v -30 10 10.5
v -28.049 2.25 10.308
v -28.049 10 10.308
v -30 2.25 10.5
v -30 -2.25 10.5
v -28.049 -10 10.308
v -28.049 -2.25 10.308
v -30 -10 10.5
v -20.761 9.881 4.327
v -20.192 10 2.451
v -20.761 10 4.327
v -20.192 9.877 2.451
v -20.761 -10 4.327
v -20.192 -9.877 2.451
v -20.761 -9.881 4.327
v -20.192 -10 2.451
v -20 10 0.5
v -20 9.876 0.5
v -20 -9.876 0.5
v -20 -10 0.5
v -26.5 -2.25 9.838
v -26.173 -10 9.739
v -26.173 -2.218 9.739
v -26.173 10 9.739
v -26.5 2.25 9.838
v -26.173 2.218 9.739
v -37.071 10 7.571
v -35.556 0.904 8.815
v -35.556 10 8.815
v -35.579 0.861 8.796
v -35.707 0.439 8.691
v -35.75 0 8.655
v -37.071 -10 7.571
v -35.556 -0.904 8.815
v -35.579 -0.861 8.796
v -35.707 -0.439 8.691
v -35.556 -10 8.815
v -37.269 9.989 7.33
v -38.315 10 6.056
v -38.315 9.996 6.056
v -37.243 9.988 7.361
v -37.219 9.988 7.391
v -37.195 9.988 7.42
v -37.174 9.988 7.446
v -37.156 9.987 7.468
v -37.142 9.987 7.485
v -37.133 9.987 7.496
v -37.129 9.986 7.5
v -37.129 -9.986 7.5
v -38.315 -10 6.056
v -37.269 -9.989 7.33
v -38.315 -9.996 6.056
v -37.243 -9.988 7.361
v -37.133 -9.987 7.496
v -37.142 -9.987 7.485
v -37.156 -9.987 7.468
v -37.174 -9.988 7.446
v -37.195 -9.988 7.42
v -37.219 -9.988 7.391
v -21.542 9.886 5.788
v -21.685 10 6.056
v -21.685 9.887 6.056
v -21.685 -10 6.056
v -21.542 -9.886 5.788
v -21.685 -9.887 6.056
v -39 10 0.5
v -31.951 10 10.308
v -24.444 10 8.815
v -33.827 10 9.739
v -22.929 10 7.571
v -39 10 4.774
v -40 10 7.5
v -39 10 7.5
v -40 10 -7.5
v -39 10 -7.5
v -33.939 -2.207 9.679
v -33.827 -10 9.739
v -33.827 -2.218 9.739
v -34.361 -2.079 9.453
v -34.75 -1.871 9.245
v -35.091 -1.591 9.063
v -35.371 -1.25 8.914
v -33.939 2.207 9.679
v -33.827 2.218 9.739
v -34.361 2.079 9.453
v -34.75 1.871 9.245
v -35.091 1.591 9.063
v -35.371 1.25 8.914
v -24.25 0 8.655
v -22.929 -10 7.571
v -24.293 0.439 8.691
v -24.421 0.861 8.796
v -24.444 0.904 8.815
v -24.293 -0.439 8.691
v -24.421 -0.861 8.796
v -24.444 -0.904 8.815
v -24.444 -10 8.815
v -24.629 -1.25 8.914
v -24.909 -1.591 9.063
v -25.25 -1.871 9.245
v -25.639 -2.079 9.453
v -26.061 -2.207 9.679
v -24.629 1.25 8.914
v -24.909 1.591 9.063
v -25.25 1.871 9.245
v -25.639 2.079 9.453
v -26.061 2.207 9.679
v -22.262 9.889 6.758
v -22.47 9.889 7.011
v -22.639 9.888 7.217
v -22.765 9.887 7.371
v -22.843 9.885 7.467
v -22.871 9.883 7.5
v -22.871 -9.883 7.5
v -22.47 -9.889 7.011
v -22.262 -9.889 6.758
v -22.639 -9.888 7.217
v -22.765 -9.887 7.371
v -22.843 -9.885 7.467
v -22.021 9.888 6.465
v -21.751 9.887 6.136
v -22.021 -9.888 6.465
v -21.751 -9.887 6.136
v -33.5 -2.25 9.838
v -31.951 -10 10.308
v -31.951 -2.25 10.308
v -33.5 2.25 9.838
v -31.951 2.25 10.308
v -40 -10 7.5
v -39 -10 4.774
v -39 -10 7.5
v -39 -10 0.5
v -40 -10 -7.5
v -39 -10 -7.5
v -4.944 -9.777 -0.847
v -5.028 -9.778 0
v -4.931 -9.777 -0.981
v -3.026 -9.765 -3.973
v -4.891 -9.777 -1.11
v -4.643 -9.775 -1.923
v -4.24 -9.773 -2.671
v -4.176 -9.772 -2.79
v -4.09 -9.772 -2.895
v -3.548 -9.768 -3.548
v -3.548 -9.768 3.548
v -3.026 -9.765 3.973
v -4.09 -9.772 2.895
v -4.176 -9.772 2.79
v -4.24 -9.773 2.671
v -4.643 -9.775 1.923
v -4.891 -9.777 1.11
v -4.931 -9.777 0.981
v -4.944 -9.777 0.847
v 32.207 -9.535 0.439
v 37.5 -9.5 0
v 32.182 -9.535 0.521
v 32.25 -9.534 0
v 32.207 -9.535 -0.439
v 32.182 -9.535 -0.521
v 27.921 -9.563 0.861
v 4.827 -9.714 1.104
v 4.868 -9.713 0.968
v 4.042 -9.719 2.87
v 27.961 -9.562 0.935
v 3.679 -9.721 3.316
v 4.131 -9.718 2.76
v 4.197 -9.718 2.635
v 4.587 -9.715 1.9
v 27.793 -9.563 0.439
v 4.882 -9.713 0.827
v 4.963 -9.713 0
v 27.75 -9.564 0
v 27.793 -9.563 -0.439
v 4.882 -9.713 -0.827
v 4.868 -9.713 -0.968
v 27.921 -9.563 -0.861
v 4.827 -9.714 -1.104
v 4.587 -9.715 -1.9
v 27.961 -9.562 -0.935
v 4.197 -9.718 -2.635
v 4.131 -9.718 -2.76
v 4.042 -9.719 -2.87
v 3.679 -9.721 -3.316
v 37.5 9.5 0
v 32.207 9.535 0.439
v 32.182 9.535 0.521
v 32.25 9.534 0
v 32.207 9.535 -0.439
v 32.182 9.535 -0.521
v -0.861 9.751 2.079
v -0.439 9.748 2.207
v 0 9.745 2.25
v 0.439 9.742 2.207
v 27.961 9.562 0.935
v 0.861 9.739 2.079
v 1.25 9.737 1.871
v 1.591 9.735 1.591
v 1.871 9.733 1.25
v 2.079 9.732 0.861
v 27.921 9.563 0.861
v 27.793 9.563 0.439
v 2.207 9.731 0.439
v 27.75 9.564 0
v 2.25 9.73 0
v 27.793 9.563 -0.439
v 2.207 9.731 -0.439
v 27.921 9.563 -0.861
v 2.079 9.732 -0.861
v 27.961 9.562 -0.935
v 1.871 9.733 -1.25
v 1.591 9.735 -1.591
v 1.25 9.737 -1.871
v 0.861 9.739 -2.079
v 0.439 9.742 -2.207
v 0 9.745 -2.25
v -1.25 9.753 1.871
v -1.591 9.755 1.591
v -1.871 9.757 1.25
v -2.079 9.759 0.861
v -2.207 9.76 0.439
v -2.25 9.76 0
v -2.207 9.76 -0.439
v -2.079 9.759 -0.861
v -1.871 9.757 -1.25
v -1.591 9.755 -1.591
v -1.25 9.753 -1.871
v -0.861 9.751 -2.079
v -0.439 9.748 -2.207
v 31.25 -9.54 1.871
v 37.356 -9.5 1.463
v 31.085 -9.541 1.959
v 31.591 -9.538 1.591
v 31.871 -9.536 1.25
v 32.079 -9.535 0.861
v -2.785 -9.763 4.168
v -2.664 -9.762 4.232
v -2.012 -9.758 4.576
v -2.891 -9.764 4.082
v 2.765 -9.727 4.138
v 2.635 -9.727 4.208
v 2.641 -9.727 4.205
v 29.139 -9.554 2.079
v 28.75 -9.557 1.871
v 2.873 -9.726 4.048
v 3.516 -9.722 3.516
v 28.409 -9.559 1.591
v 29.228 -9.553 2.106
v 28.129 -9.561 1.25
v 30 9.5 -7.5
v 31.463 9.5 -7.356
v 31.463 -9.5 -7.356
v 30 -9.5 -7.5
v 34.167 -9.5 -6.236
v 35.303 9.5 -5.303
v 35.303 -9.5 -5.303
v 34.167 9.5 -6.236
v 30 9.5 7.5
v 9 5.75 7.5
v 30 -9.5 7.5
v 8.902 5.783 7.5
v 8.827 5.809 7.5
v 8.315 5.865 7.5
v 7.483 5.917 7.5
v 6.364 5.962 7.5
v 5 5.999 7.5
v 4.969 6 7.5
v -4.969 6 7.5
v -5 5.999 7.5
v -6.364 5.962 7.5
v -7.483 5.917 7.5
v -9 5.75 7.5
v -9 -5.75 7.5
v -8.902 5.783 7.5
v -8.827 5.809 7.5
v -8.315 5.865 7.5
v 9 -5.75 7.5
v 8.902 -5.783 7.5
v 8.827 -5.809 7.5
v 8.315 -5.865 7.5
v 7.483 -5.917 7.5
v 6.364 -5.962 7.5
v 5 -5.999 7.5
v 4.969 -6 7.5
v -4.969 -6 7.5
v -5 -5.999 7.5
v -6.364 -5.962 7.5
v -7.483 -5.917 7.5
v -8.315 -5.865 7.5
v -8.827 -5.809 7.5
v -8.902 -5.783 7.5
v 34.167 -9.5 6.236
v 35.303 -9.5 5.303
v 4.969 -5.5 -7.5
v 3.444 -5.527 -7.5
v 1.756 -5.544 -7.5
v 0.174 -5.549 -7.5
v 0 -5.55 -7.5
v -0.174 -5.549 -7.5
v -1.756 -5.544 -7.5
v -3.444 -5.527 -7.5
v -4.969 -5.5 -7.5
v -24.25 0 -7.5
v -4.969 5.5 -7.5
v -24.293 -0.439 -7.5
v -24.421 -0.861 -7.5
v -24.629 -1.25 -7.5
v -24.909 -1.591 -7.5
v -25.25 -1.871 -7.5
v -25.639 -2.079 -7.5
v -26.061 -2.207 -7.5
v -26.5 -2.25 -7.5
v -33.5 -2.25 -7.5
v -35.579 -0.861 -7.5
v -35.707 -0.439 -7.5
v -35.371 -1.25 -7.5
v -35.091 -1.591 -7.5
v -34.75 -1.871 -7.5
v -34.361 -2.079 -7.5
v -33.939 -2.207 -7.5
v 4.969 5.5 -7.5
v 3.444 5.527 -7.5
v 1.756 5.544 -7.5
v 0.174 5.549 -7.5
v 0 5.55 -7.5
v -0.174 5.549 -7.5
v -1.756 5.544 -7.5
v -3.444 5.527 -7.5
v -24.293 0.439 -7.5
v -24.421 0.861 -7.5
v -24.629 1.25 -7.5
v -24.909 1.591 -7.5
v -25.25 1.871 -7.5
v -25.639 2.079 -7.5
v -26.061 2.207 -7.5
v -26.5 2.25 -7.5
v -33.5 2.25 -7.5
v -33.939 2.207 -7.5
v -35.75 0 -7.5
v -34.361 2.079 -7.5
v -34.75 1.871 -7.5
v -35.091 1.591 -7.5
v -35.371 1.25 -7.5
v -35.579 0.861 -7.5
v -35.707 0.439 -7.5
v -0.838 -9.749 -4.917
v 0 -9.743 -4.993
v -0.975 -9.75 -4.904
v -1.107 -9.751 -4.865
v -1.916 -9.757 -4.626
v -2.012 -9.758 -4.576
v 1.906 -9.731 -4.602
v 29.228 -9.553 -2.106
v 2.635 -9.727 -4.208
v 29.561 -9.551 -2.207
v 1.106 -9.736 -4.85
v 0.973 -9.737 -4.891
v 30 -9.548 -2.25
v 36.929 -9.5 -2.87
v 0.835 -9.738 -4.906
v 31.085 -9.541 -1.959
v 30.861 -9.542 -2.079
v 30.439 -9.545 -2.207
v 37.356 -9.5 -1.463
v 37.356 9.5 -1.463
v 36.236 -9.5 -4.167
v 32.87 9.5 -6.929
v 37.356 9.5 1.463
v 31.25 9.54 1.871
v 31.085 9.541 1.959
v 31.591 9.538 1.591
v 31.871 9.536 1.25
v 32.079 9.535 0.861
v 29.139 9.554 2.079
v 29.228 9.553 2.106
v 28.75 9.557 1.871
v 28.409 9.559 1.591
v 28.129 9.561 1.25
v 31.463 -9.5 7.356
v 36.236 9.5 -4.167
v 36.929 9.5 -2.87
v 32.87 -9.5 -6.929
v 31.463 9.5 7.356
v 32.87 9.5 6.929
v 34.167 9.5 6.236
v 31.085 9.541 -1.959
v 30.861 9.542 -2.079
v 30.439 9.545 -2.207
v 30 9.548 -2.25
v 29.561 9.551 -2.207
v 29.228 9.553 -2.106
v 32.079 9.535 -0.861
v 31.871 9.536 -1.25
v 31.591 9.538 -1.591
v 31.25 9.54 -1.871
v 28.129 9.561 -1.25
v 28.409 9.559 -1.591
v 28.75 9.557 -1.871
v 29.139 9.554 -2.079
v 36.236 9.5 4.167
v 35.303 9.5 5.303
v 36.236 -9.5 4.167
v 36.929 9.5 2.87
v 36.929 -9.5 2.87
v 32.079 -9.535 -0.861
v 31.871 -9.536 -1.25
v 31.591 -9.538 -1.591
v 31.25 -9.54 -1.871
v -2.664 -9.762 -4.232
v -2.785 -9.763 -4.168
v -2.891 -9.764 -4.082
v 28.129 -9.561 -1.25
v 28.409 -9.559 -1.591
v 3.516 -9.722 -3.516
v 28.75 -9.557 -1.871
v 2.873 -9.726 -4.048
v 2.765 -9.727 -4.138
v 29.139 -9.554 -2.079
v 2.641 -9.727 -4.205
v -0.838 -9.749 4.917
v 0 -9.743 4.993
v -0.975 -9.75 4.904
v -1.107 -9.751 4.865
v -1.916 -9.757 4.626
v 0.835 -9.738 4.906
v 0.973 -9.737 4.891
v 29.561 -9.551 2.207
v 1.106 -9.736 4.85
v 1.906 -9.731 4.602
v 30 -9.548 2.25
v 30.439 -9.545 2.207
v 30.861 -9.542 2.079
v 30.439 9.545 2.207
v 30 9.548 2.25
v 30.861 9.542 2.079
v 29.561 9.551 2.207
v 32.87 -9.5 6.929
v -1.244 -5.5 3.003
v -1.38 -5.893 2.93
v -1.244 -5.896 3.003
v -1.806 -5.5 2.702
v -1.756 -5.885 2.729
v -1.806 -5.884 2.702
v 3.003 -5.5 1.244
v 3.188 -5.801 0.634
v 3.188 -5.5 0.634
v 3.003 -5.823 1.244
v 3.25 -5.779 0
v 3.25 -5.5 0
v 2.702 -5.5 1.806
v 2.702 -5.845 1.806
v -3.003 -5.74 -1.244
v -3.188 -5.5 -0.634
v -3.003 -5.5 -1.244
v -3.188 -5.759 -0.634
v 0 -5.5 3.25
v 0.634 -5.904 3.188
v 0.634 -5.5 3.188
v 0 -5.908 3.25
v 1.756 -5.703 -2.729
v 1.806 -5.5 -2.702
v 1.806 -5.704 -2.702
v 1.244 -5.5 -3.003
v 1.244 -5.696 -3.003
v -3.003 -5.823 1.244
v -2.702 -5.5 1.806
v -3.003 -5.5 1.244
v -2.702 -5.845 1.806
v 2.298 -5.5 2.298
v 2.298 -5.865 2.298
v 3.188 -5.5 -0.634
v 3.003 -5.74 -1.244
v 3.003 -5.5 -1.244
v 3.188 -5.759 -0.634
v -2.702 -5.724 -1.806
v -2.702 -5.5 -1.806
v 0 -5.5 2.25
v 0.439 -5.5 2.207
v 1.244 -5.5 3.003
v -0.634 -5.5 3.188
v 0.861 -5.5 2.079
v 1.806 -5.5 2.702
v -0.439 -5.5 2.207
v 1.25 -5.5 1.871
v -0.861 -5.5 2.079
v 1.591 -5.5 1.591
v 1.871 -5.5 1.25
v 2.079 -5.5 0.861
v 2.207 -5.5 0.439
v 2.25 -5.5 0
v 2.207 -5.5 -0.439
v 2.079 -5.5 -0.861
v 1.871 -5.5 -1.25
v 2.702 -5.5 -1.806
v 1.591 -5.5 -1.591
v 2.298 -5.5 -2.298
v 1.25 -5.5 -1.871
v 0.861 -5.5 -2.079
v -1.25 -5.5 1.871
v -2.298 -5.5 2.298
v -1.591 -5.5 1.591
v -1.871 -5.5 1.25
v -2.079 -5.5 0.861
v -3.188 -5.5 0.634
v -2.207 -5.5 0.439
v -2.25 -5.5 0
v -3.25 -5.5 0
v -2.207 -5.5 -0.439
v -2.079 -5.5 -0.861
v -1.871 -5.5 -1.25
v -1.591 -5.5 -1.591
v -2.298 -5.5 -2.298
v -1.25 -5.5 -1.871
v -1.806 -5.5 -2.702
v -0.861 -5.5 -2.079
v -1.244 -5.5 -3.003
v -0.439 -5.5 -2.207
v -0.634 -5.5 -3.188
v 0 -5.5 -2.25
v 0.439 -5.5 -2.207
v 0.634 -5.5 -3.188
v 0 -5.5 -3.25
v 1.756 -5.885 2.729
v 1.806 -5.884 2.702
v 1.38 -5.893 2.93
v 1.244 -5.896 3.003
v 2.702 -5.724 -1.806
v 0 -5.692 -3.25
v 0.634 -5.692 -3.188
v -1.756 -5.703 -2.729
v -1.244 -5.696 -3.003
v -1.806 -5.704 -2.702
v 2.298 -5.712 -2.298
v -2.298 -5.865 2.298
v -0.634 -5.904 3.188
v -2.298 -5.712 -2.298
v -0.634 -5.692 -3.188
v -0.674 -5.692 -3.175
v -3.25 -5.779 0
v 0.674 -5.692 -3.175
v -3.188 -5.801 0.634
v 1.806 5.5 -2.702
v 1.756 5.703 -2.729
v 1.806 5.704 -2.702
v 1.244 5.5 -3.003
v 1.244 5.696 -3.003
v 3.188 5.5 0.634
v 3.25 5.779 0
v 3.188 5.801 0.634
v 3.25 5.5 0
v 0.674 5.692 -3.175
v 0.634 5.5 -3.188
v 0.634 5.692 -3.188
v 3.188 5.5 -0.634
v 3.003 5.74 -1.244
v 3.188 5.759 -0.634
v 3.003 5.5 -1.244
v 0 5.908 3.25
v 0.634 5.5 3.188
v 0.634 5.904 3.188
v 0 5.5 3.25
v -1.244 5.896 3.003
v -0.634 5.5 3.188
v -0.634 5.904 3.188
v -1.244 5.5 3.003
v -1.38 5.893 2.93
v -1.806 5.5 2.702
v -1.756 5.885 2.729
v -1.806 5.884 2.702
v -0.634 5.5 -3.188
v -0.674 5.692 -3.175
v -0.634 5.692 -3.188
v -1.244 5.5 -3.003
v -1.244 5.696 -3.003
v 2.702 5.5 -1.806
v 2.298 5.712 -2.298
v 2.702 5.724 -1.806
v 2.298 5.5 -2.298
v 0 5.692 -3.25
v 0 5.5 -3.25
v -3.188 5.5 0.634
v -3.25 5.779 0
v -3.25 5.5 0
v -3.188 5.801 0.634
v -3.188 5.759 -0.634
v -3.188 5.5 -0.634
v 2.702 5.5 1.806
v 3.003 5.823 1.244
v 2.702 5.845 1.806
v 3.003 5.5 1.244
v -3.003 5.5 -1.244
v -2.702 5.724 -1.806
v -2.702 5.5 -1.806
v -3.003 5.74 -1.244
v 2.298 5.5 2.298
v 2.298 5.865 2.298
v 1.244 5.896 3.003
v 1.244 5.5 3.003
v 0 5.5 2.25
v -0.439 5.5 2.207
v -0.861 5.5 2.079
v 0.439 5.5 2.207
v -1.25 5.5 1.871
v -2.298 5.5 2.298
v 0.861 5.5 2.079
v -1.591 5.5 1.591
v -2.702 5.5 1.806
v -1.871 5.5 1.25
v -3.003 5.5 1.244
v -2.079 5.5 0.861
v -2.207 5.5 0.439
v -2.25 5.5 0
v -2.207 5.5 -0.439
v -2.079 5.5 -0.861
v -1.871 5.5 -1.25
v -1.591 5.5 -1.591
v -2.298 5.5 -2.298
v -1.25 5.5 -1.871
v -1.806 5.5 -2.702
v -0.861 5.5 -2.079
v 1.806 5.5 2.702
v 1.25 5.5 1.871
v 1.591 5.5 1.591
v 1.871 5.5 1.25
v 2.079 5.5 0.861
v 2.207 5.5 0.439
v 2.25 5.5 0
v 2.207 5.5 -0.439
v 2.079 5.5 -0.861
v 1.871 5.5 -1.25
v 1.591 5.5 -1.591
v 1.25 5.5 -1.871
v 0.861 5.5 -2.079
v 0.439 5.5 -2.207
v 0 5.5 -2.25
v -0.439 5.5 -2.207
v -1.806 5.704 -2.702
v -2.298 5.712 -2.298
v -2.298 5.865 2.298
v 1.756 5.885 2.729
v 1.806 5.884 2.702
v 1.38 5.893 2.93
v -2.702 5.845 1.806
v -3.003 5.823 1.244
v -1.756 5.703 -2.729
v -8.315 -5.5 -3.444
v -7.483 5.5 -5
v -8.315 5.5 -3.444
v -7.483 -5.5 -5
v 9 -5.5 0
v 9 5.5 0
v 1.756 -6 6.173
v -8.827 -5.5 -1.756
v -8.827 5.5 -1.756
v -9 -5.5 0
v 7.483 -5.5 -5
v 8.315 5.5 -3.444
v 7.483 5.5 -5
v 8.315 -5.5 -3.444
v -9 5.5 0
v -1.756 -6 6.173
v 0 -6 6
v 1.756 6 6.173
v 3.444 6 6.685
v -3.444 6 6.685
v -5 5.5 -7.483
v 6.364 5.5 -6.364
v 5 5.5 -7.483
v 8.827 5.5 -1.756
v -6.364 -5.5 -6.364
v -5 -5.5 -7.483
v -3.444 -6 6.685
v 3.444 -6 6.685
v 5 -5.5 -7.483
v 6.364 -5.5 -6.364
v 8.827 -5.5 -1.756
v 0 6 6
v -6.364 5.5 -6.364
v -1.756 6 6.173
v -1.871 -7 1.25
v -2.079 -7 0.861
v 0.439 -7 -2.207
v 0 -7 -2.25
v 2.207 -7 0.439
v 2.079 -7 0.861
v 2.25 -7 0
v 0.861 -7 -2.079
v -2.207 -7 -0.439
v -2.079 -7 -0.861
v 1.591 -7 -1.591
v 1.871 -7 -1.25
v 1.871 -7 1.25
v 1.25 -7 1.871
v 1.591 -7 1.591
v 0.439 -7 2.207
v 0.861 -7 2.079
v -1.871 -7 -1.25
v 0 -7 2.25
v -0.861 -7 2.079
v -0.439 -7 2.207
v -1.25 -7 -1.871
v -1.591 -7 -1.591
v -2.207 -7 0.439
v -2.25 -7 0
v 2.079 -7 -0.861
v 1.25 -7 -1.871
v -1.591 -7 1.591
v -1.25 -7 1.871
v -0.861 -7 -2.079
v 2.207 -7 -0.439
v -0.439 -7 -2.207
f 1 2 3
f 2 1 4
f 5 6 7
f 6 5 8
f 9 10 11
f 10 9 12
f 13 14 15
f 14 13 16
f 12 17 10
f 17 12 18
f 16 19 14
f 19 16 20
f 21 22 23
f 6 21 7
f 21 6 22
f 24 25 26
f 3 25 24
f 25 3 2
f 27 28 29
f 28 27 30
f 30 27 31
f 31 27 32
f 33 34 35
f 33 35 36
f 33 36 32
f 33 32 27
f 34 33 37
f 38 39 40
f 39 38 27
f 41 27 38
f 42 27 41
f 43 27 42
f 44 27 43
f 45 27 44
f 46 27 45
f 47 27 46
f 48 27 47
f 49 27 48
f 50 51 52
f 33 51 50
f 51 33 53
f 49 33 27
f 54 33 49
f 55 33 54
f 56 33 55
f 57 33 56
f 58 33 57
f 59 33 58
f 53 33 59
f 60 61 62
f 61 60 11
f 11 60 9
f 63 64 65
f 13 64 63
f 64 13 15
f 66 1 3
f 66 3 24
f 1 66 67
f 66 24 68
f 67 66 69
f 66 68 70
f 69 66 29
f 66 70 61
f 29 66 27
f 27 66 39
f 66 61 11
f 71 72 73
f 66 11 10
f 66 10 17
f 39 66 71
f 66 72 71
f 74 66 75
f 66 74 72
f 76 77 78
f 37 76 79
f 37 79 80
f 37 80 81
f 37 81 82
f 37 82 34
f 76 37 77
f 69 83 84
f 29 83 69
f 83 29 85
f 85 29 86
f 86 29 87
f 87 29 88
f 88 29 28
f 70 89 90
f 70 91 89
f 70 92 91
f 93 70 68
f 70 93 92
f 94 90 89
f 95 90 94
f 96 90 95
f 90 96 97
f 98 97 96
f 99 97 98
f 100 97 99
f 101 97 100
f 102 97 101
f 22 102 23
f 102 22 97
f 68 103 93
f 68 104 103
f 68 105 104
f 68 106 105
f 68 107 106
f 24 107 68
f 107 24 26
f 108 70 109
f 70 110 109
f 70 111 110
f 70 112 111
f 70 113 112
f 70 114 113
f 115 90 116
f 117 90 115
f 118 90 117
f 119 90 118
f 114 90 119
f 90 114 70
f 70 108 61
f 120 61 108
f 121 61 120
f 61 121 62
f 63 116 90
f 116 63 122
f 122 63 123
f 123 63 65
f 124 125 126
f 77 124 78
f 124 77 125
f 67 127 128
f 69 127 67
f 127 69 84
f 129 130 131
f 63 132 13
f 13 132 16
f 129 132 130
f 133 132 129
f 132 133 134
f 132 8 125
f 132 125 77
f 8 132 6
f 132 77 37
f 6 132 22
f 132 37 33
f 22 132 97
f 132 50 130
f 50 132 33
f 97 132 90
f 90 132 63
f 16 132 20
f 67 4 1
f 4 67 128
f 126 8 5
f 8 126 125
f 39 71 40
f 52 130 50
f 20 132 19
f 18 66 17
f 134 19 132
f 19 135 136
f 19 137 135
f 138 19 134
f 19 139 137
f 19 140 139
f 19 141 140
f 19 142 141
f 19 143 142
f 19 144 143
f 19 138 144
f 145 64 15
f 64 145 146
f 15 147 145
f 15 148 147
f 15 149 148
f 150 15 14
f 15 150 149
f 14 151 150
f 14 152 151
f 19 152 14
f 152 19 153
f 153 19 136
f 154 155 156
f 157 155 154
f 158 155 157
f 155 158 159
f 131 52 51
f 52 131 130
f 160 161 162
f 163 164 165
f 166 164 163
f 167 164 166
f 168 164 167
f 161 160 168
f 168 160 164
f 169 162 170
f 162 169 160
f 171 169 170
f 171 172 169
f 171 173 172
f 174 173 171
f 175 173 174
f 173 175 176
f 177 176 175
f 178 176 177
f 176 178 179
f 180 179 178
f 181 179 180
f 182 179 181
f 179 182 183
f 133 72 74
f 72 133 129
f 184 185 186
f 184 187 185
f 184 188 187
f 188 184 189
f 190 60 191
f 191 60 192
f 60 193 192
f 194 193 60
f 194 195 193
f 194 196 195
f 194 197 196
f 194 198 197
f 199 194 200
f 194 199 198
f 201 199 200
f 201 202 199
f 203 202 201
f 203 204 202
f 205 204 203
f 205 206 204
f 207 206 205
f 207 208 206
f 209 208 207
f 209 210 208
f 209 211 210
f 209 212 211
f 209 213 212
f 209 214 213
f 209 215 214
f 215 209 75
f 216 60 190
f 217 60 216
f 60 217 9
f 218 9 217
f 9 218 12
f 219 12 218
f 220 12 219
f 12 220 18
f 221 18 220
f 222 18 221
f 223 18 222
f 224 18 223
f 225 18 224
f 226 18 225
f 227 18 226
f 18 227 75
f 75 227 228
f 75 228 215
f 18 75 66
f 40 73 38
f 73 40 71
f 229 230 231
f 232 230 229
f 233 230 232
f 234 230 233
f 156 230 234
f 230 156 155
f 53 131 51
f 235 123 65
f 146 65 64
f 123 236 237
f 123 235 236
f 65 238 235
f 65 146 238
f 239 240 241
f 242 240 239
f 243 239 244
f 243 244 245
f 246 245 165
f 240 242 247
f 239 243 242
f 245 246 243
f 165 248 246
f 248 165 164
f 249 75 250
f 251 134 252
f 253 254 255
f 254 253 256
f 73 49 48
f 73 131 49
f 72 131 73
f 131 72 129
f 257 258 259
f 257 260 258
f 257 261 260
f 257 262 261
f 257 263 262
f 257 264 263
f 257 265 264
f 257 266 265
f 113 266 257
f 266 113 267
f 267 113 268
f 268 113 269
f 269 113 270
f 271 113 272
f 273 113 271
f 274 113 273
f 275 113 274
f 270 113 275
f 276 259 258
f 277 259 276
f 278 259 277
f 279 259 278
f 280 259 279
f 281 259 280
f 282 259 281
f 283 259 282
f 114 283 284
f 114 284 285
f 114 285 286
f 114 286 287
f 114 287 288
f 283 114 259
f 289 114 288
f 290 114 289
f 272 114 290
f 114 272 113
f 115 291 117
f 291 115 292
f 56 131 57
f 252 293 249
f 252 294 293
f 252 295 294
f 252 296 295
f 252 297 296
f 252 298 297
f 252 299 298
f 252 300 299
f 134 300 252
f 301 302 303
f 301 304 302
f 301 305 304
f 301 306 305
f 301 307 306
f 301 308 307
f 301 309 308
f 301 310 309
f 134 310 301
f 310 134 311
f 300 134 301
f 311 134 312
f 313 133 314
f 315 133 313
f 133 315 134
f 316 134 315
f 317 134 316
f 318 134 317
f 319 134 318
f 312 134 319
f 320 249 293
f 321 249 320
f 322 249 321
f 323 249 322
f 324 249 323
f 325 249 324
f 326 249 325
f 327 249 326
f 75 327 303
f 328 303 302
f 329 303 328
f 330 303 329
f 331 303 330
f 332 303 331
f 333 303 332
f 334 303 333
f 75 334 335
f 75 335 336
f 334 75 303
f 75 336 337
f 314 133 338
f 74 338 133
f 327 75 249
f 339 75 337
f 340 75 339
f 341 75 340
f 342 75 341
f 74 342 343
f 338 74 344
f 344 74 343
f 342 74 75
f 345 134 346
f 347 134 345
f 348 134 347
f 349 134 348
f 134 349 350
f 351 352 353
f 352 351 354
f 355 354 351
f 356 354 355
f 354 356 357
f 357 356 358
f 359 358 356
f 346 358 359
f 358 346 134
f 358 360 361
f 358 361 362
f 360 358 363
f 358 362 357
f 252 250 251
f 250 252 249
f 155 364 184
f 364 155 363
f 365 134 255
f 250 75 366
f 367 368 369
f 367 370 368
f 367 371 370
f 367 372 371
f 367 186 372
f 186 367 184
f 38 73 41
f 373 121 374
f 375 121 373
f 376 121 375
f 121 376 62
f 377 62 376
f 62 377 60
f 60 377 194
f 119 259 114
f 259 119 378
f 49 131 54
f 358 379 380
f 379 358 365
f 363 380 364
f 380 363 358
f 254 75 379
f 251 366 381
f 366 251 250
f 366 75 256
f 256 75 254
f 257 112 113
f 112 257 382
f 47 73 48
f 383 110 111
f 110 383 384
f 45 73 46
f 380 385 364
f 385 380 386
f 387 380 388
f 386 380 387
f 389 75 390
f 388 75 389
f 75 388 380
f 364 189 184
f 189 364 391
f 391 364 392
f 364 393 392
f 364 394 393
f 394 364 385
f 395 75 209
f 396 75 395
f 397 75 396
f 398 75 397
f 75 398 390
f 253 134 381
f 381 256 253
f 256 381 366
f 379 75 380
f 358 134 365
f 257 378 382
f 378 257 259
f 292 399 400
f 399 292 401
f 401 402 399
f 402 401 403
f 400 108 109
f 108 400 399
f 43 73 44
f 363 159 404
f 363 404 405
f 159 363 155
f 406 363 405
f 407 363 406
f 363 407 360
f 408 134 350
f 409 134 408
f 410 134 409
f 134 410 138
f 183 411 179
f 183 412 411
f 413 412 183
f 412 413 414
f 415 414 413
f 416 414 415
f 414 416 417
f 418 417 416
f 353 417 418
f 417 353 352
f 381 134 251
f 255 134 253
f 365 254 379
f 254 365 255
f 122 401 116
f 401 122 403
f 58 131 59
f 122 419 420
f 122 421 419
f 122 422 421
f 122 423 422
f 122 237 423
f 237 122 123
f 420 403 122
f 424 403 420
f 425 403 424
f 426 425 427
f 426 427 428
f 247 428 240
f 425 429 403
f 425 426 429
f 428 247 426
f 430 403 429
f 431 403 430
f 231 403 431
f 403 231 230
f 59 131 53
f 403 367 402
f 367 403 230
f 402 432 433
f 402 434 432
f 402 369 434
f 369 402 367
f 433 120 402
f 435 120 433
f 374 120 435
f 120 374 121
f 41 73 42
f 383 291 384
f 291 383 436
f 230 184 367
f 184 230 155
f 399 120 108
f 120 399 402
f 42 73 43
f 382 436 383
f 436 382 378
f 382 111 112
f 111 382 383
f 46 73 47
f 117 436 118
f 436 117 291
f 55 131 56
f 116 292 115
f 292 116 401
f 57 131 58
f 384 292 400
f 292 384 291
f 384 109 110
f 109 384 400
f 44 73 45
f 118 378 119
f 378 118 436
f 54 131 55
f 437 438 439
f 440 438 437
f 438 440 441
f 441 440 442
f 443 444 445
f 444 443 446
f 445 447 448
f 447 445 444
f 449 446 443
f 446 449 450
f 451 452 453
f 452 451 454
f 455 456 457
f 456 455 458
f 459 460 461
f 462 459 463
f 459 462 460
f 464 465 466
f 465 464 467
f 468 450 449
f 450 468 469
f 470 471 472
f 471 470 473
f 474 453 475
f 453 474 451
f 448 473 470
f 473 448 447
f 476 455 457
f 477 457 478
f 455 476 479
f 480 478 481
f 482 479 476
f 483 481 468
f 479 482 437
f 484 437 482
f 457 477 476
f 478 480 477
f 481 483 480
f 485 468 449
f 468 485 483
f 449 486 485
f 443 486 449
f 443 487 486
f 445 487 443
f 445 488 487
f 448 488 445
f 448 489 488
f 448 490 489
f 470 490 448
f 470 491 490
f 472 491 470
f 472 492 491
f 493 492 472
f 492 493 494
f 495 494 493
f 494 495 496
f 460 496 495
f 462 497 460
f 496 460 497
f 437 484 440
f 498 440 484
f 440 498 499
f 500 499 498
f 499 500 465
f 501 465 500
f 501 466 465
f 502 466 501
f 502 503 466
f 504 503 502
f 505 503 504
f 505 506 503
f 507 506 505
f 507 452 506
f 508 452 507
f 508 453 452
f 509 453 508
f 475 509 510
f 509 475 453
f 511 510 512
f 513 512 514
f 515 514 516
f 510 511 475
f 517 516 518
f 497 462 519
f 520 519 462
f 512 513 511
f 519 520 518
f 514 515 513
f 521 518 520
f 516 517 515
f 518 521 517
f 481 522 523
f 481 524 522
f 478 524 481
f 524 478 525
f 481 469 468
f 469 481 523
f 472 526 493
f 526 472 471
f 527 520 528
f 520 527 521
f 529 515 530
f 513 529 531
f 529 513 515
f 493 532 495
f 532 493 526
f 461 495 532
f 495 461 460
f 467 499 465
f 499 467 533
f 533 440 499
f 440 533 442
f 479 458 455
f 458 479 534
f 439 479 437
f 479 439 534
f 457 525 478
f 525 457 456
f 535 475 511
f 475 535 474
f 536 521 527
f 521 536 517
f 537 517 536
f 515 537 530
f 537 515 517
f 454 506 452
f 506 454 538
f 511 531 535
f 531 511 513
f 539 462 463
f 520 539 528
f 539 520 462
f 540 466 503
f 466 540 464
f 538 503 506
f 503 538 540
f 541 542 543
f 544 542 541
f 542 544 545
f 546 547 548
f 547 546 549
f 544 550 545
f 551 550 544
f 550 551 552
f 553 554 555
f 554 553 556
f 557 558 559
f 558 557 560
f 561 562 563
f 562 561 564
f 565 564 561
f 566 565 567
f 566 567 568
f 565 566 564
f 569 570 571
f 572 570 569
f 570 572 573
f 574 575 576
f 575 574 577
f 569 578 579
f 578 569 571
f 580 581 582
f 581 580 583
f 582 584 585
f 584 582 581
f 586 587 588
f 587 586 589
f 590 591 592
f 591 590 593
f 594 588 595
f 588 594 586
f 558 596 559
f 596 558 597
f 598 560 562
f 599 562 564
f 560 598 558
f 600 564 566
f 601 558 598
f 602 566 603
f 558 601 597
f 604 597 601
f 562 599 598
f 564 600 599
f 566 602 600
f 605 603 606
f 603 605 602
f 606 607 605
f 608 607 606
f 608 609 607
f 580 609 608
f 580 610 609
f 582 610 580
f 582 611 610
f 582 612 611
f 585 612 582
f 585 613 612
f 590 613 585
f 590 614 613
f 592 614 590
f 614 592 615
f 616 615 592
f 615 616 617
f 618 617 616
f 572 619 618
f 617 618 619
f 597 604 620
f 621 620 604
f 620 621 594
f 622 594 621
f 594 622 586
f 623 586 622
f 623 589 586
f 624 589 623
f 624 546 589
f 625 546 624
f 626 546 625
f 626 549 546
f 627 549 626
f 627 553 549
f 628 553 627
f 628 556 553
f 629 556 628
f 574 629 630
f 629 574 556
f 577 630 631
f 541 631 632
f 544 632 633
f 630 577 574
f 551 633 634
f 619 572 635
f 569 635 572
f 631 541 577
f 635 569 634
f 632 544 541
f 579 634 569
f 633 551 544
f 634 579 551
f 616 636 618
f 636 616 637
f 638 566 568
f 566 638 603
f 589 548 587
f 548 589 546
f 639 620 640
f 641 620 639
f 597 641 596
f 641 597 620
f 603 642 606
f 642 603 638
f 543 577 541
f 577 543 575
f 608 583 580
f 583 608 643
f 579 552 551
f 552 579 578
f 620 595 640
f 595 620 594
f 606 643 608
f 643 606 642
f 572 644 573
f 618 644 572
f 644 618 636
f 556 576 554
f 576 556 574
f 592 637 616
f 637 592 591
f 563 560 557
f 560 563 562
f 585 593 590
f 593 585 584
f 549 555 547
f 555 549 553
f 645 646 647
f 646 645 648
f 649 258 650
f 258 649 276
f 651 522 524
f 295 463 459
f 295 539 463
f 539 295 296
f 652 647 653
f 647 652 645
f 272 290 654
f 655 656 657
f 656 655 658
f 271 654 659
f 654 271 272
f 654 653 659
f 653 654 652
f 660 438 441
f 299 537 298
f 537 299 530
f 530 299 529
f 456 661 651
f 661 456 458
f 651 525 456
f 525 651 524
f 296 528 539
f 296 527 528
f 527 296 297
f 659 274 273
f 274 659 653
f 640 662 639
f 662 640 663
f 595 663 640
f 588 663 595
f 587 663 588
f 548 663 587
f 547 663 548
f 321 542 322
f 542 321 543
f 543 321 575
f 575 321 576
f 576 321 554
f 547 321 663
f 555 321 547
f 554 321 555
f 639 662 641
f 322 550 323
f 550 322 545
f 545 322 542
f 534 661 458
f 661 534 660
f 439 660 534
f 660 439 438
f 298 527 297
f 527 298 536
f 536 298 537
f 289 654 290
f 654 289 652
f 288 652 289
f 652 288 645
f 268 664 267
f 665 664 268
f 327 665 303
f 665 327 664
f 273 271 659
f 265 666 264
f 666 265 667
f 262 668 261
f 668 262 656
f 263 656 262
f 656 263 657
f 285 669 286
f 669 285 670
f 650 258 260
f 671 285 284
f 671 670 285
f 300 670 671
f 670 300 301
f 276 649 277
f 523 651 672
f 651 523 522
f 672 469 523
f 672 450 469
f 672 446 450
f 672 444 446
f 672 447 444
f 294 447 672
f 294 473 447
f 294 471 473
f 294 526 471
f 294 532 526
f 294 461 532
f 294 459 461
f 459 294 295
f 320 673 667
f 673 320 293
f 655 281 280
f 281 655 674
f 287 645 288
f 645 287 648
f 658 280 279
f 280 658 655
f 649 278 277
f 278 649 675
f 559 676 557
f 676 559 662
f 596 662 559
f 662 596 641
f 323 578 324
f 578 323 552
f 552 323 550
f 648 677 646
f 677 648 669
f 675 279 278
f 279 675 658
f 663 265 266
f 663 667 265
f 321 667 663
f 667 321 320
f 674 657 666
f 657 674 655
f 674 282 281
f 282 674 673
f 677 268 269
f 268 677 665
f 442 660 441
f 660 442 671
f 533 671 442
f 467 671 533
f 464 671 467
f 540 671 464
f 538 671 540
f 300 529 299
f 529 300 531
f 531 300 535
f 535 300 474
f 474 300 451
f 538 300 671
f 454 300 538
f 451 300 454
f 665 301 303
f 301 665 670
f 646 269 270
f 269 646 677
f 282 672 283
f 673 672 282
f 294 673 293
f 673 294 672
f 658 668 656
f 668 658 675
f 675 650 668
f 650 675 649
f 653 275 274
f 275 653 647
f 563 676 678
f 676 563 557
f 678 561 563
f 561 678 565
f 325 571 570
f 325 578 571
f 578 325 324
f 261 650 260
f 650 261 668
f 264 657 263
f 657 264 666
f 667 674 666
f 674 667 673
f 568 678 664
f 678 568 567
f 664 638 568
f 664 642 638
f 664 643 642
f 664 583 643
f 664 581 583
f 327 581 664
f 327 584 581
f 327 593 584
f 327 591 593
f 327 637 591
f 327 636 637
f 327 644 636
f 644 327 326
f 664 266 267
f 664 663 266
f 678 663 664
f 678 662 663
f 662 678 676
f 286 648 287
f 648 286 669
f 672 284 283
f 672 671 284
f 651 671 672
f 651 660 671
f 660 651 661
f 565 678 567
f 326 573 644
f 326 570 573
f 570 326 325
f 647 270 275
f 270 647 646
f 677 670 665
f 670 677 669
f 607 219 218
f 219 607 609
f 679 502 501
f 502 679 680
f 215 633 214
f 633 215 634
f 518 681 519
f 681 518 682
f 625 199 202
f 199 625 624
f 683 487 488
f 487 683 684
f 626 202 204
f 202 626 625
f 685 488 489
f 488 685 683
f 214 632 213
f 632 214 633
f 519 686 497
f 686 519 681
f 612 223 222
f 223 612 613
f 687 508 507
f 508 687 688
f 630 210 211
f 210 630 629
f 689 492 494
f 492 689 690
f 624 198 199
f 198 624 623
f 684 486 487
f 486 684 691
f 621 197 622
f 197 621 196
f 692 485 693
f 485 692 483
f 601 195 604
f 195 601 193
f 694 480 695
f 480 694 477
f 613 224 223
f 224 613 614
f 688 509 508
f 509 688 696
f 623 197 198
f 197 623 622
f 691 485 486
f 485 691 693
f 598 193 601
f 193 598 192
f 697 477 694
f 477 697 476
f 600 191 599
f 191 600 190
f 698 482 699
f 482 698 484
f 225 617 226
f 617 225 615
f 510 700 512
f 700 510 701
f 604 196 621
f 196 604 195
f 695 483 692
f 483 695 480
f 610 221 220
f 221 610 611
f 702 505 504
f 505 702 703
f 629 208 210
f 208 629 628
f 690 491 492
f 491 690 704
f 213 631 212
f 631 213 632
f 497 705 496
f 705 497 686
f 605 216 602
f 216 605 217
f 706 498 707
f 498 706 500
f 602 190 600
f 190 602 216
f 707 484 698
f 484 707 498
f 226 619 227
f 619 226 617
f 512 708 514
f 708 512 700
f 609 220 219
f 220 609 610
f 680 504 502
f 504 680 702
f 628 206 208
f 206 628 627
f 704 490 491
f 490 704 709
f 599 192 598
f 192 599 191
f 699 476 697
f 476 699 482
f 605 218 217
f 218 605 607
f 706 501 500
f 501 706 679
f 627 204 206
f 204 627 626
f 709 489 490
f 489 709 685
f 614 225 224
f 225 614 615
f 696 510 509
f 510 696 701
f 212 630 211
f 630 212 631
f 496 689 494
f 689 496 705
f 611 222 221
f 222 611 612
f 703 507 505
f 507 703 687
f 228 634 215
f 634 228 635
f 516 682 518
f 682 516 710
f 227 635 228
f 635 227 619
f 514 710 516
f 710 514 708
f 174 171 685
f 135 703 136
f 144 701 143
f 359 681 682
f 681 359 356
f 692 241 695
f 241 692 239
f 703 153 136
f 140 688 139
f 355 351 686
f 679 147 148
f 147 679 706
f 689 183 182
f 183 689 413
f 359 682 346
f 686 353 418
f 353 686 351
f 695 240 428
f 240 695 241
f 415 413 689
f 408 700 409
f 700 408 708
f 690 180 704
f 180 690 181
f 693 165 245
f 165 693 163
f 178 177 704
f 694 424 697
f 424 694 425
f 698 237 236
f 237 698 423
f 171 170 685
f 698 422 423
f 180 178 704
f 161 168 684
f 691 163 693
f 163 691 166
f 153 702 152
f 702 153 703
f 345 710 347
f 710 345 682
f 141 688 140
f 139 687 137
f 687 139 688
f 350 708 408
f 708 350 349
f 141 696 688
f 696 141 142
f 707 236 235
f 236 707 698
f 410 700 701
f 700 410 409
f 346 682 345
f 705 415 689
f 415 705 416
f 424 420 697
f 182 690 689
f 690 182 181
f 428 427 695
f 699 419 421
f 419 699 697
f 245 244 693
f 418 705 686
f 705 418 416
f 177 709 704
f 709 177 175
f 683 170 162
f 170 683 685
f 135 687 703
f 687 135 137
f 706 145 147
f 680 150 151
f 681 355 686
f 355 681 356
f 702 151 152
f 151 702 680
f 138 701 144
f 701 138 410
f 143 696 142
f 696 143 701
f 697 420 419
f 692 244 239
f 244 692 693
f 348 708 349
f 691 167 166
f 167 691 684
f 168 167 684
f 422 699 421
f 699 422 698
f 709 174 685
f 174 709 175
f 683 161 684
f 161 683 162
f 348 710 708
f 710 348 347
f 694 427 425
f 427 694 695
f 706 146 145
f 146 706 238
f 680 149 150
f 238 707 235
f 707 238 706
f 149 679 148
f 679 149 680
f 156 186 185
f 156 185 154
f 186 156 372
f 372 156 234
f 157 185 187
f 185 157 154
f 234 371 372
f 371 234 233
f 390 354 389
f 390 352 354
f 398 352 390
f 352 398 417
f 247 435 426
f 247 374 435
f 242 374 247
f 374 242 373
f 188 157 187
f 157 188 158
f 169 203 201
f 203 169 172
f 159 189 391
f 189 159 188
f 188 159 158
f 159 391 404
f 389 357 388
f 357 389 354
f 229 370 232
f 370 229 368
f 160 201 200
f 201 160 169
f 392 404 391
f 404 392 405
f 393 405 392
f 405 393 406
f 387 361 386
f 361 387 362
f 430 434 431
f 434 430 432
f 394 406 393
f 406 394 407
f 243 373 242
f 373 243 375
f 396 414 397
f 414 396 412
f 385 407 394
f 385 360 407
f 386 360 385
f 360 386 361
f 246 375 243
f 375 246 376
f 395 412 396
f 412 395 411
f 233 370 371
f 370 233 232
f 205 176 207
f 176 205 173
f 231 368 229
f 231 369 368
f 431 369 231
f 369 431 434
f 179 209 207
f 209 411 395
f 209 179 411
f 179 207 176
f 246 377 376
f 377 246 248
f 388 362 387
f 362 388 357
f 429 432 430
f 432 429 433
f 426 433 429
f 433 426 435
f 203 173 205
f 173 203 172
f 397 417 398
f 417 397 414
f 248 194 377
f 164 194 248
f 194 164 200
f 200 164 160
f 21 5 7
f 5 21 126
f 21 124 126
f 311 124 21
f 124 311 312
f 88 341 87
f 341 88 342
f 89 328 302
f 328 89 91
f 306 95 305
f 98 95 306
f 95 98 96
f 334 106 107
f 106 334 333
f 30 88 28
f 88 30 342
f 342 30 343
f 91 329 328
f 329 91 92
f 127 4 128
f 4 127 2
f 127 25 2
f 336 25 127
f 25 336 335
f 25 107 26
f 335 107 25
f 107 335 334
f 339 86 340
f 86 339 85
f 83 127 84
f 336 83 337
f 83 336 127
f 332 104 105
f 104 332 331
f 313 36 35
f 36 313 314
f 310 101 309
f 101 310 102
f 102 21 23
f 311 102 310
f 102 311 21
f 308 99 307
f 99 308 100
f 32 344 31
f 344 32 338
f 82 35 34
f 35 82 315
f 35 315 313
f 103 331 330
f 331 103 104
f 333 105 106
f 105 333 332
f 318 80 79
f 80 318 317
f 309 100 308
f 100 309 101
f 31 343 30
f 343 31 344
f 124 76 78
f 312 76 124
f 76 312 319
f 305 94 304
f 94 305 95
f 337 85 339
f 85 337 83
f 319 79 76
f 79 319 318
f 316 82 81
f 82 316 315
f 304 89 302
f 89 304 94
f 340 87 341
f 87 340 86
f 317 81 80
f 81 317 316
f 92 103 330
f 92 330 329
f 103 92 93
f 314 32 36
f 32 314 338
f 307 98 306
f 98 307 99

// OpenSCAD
// file: modules.scad
// Fonctions personnalisées

//http://forum.openscad.org/Wish-mirror-copy-true-td10681.html
module copy_mirror(vec=[0,1,0])
{
    children();
    mirror(vec) children();
}

module ecrou(plat,h){
  cylinder(d=plat*2/sqrt(3), h=h, $fn=6);
}


module courroie(diam,longueur){
  color ("black")
  difference(){
    hull(){
      cylinder(d=diam+1, h=6, $fn=32);
      translate([longueur,0,0]) cylinder(d=diam+1, h=6, $fn=32);
    }
    translate([0,0,-1])
    hull(){
      cylinder(d=diam-1, h=8, $fn=32);
      translate([longueur,0,0]) cylinder(d=diam-1, h=8, $fn=32);
    }
  }
  
  
}
// file: config.scad
// Paramètres de la machine

decal=-30;            // décallage du chassis xz
hauteur=400;          // hauteur totale chassis
largeur=400;          // largeur totale chassis
longueur=470;         // longueur totale chassis
hauteur_base=90;      // hauteur de la base
entraxe_y=140;        // distance entre les tiges Ø8 axe Y
entraxe_x=45;         // distance entre les tiges Ø8 axe X

couleur=[1,0.6,0];


// Plats écrous
ec3=5.7;
ec4=7.2;
ec5=8.2;
ec6=10.2;

// Jeu sur plats pour les écrous glissants
jec=0.2;

// hauteur écrous
ec3h=2.4;
ec4h=3.2;
ec5h=4.7;
ec6h=5.2;

// Vis
vis3=3.5;
vis4=4.5;
vis5=5.5;
vis6=6.5;


// Paramètre des pièces et jeux

// écart plateau/courroie
// y_belt_holder
belt_h=13;      // écart entre la courroie et le plateau

// écart plateau/tiges lisses
// y_lm8uu
decal_plateau=12; // Décallage en Y

// décallage des tiges lisses Y
// support_tige8_y
decal_tiges=5;

// décallage moteur Y
// y_motor
decal_motory_z=11;
decal_motory_y=25;

// Equerres de fixation position fermée
eq_ec=10;      // écart entre profilés

// Fixations axe Z
pos_z=26;      // position des axes par rapport au profilé (>= 21)
hauteur_z=20;  // hauteur des fixations
entraxe_z=17;  // distance entre les tiges Ø8 et M5
// est ce que la tige de 8 dépasse du profilé de 30?
// si oui, on décale les fixations
decalx=max(-42/2+entraxe_z+8/2+2, 0);

// Roulements linéaires
lbd = 15; // diamètre ext
lbh = 24; // hauteur

// x_carriage
he_x=23;  // entraxe hotend x
he_y=23;  // entraxe hotend y
sen_x=20; // entraxe capteur x
sen_y=23; // entraxe capteur y

// sensor_holder
sen_ep=3;   // épaisseur
sen_d=12.5; // diamètre du capteur
sen_pos=0;  // décentrage en x du capteur
sen_z=7;    // position Z de la bague

// y_belt_idler
ybi_ep1=4;       // épaisseur de la partie fixe
ybi_ep2=4;       // épaisseur de la partie mobile
ybi_h=16;        // position de l'axe
ybi_ec=11;       // écart pour le passage du ou des roulement
ybi_vis=vis4;    // diamètre passage de vis (axe)
ybi_ecrou=ec4;   // plat écrou
ybi_ecrouh=ec4h; // hauteur écrou
ybi_long=60;     // longueur de la partie mobile entre axes
ybi_prof=15;     // largeur de la partie mobile


// nombre de dents des poulies
poulie=20;

// Pas des courroies
pas=2;

// diamètre des poulies
dpoulie=poulie*pas/3.1416;
// main file
// eLKa1
// y_belt_idler_2
// GNU GPL v3
// lkiefer <blog.lkiefer.org> and contributors
// http://www.reprap.org/wiki/ELKa
// https://github.com/kimented/elka1

include <config.scad>;
use <modules.scad>;

module y_belt_idler_2(){
  $fn=32;
  echo ("y_belt_idler_2");
  echo ("├ écrou M4");
  echo (str("└ vis FS M4 x ", (ybi_ec+2*ybi_ep2)+4));
  
  color (couleur) rotate([90,0,0]) {
    //cylinder(d=largeur, h=ecart);
    //translate([])
    difference(){
      union(){
        hull(){
          translate([-ybi_long/2-10,-ybi_prof/2,-(ybi_ec+2*ybi_ep2)/2-0.5]) cube([1,ybi_prof,ybi_ec+2*ybi_ep2+1]);
          translate([ybi_long/2,0,0]) cylinder(d=ybi_prof, h=ybi_ec+2*ybi_ep2, center=true);
        }
        // demi cylindre
        translate([-ybi_long/2,ybi_prof/2-7,0]) 
        intersection(){
          cylinder(d=20, h=ybi_ec+2*ybi_ep2+1, center=true);
          translate([-10,0,-ybi_ec/2-ybi_ep2-0.5]) cube([20,20,ybi_ec+2*ybi_ep2+1]);
        }
        
      }
      // trou roulement
      difference(){
        hull(){
          cylinder(h=ybi_ec, d=18, center=true);
          translate([0,ybi_prof,0]) cylinder(h=ybi_ec+1, d=18, center=true);
        }
        // Rondelle hauteur 0.5
        copy_mirror([0,0,1]) translate([0,0,ybi_ec/2]) cylinder(h=0.5,d=vis4+2);
      }
      cylinder(d=vis4, h=ybi_ec+2*ybi_ep2+2, center=true);
      rotate([180,0,0]) translate([0,0,-ybi_ec/2-ybi_ep2-1.5]) cylinder(d1=vis4+8, d2=vis4, h=4);
      // axe
      translate([ybi_long/2,0,0]) cylinder(d=vis4, h=ybi_ec+2*ybi_ep2+2, center=true);
      // serrage
      hull(){
        rotate([90,0,0]) translate([-ybi_long/2+10-2.5-ybi_ep2,0,0]) cylinder(d=vis4, h=ybi_prof+10+2, center=true);
        rotate([90,0,0]) translate([-ybi_long/2-10+2.5+ybi_ep2,0,0]) cylinder(d=vis4, h=ybi_prof+10+2, center=true);
      }
    }
    
  }
}

y_belt_idler_2();
